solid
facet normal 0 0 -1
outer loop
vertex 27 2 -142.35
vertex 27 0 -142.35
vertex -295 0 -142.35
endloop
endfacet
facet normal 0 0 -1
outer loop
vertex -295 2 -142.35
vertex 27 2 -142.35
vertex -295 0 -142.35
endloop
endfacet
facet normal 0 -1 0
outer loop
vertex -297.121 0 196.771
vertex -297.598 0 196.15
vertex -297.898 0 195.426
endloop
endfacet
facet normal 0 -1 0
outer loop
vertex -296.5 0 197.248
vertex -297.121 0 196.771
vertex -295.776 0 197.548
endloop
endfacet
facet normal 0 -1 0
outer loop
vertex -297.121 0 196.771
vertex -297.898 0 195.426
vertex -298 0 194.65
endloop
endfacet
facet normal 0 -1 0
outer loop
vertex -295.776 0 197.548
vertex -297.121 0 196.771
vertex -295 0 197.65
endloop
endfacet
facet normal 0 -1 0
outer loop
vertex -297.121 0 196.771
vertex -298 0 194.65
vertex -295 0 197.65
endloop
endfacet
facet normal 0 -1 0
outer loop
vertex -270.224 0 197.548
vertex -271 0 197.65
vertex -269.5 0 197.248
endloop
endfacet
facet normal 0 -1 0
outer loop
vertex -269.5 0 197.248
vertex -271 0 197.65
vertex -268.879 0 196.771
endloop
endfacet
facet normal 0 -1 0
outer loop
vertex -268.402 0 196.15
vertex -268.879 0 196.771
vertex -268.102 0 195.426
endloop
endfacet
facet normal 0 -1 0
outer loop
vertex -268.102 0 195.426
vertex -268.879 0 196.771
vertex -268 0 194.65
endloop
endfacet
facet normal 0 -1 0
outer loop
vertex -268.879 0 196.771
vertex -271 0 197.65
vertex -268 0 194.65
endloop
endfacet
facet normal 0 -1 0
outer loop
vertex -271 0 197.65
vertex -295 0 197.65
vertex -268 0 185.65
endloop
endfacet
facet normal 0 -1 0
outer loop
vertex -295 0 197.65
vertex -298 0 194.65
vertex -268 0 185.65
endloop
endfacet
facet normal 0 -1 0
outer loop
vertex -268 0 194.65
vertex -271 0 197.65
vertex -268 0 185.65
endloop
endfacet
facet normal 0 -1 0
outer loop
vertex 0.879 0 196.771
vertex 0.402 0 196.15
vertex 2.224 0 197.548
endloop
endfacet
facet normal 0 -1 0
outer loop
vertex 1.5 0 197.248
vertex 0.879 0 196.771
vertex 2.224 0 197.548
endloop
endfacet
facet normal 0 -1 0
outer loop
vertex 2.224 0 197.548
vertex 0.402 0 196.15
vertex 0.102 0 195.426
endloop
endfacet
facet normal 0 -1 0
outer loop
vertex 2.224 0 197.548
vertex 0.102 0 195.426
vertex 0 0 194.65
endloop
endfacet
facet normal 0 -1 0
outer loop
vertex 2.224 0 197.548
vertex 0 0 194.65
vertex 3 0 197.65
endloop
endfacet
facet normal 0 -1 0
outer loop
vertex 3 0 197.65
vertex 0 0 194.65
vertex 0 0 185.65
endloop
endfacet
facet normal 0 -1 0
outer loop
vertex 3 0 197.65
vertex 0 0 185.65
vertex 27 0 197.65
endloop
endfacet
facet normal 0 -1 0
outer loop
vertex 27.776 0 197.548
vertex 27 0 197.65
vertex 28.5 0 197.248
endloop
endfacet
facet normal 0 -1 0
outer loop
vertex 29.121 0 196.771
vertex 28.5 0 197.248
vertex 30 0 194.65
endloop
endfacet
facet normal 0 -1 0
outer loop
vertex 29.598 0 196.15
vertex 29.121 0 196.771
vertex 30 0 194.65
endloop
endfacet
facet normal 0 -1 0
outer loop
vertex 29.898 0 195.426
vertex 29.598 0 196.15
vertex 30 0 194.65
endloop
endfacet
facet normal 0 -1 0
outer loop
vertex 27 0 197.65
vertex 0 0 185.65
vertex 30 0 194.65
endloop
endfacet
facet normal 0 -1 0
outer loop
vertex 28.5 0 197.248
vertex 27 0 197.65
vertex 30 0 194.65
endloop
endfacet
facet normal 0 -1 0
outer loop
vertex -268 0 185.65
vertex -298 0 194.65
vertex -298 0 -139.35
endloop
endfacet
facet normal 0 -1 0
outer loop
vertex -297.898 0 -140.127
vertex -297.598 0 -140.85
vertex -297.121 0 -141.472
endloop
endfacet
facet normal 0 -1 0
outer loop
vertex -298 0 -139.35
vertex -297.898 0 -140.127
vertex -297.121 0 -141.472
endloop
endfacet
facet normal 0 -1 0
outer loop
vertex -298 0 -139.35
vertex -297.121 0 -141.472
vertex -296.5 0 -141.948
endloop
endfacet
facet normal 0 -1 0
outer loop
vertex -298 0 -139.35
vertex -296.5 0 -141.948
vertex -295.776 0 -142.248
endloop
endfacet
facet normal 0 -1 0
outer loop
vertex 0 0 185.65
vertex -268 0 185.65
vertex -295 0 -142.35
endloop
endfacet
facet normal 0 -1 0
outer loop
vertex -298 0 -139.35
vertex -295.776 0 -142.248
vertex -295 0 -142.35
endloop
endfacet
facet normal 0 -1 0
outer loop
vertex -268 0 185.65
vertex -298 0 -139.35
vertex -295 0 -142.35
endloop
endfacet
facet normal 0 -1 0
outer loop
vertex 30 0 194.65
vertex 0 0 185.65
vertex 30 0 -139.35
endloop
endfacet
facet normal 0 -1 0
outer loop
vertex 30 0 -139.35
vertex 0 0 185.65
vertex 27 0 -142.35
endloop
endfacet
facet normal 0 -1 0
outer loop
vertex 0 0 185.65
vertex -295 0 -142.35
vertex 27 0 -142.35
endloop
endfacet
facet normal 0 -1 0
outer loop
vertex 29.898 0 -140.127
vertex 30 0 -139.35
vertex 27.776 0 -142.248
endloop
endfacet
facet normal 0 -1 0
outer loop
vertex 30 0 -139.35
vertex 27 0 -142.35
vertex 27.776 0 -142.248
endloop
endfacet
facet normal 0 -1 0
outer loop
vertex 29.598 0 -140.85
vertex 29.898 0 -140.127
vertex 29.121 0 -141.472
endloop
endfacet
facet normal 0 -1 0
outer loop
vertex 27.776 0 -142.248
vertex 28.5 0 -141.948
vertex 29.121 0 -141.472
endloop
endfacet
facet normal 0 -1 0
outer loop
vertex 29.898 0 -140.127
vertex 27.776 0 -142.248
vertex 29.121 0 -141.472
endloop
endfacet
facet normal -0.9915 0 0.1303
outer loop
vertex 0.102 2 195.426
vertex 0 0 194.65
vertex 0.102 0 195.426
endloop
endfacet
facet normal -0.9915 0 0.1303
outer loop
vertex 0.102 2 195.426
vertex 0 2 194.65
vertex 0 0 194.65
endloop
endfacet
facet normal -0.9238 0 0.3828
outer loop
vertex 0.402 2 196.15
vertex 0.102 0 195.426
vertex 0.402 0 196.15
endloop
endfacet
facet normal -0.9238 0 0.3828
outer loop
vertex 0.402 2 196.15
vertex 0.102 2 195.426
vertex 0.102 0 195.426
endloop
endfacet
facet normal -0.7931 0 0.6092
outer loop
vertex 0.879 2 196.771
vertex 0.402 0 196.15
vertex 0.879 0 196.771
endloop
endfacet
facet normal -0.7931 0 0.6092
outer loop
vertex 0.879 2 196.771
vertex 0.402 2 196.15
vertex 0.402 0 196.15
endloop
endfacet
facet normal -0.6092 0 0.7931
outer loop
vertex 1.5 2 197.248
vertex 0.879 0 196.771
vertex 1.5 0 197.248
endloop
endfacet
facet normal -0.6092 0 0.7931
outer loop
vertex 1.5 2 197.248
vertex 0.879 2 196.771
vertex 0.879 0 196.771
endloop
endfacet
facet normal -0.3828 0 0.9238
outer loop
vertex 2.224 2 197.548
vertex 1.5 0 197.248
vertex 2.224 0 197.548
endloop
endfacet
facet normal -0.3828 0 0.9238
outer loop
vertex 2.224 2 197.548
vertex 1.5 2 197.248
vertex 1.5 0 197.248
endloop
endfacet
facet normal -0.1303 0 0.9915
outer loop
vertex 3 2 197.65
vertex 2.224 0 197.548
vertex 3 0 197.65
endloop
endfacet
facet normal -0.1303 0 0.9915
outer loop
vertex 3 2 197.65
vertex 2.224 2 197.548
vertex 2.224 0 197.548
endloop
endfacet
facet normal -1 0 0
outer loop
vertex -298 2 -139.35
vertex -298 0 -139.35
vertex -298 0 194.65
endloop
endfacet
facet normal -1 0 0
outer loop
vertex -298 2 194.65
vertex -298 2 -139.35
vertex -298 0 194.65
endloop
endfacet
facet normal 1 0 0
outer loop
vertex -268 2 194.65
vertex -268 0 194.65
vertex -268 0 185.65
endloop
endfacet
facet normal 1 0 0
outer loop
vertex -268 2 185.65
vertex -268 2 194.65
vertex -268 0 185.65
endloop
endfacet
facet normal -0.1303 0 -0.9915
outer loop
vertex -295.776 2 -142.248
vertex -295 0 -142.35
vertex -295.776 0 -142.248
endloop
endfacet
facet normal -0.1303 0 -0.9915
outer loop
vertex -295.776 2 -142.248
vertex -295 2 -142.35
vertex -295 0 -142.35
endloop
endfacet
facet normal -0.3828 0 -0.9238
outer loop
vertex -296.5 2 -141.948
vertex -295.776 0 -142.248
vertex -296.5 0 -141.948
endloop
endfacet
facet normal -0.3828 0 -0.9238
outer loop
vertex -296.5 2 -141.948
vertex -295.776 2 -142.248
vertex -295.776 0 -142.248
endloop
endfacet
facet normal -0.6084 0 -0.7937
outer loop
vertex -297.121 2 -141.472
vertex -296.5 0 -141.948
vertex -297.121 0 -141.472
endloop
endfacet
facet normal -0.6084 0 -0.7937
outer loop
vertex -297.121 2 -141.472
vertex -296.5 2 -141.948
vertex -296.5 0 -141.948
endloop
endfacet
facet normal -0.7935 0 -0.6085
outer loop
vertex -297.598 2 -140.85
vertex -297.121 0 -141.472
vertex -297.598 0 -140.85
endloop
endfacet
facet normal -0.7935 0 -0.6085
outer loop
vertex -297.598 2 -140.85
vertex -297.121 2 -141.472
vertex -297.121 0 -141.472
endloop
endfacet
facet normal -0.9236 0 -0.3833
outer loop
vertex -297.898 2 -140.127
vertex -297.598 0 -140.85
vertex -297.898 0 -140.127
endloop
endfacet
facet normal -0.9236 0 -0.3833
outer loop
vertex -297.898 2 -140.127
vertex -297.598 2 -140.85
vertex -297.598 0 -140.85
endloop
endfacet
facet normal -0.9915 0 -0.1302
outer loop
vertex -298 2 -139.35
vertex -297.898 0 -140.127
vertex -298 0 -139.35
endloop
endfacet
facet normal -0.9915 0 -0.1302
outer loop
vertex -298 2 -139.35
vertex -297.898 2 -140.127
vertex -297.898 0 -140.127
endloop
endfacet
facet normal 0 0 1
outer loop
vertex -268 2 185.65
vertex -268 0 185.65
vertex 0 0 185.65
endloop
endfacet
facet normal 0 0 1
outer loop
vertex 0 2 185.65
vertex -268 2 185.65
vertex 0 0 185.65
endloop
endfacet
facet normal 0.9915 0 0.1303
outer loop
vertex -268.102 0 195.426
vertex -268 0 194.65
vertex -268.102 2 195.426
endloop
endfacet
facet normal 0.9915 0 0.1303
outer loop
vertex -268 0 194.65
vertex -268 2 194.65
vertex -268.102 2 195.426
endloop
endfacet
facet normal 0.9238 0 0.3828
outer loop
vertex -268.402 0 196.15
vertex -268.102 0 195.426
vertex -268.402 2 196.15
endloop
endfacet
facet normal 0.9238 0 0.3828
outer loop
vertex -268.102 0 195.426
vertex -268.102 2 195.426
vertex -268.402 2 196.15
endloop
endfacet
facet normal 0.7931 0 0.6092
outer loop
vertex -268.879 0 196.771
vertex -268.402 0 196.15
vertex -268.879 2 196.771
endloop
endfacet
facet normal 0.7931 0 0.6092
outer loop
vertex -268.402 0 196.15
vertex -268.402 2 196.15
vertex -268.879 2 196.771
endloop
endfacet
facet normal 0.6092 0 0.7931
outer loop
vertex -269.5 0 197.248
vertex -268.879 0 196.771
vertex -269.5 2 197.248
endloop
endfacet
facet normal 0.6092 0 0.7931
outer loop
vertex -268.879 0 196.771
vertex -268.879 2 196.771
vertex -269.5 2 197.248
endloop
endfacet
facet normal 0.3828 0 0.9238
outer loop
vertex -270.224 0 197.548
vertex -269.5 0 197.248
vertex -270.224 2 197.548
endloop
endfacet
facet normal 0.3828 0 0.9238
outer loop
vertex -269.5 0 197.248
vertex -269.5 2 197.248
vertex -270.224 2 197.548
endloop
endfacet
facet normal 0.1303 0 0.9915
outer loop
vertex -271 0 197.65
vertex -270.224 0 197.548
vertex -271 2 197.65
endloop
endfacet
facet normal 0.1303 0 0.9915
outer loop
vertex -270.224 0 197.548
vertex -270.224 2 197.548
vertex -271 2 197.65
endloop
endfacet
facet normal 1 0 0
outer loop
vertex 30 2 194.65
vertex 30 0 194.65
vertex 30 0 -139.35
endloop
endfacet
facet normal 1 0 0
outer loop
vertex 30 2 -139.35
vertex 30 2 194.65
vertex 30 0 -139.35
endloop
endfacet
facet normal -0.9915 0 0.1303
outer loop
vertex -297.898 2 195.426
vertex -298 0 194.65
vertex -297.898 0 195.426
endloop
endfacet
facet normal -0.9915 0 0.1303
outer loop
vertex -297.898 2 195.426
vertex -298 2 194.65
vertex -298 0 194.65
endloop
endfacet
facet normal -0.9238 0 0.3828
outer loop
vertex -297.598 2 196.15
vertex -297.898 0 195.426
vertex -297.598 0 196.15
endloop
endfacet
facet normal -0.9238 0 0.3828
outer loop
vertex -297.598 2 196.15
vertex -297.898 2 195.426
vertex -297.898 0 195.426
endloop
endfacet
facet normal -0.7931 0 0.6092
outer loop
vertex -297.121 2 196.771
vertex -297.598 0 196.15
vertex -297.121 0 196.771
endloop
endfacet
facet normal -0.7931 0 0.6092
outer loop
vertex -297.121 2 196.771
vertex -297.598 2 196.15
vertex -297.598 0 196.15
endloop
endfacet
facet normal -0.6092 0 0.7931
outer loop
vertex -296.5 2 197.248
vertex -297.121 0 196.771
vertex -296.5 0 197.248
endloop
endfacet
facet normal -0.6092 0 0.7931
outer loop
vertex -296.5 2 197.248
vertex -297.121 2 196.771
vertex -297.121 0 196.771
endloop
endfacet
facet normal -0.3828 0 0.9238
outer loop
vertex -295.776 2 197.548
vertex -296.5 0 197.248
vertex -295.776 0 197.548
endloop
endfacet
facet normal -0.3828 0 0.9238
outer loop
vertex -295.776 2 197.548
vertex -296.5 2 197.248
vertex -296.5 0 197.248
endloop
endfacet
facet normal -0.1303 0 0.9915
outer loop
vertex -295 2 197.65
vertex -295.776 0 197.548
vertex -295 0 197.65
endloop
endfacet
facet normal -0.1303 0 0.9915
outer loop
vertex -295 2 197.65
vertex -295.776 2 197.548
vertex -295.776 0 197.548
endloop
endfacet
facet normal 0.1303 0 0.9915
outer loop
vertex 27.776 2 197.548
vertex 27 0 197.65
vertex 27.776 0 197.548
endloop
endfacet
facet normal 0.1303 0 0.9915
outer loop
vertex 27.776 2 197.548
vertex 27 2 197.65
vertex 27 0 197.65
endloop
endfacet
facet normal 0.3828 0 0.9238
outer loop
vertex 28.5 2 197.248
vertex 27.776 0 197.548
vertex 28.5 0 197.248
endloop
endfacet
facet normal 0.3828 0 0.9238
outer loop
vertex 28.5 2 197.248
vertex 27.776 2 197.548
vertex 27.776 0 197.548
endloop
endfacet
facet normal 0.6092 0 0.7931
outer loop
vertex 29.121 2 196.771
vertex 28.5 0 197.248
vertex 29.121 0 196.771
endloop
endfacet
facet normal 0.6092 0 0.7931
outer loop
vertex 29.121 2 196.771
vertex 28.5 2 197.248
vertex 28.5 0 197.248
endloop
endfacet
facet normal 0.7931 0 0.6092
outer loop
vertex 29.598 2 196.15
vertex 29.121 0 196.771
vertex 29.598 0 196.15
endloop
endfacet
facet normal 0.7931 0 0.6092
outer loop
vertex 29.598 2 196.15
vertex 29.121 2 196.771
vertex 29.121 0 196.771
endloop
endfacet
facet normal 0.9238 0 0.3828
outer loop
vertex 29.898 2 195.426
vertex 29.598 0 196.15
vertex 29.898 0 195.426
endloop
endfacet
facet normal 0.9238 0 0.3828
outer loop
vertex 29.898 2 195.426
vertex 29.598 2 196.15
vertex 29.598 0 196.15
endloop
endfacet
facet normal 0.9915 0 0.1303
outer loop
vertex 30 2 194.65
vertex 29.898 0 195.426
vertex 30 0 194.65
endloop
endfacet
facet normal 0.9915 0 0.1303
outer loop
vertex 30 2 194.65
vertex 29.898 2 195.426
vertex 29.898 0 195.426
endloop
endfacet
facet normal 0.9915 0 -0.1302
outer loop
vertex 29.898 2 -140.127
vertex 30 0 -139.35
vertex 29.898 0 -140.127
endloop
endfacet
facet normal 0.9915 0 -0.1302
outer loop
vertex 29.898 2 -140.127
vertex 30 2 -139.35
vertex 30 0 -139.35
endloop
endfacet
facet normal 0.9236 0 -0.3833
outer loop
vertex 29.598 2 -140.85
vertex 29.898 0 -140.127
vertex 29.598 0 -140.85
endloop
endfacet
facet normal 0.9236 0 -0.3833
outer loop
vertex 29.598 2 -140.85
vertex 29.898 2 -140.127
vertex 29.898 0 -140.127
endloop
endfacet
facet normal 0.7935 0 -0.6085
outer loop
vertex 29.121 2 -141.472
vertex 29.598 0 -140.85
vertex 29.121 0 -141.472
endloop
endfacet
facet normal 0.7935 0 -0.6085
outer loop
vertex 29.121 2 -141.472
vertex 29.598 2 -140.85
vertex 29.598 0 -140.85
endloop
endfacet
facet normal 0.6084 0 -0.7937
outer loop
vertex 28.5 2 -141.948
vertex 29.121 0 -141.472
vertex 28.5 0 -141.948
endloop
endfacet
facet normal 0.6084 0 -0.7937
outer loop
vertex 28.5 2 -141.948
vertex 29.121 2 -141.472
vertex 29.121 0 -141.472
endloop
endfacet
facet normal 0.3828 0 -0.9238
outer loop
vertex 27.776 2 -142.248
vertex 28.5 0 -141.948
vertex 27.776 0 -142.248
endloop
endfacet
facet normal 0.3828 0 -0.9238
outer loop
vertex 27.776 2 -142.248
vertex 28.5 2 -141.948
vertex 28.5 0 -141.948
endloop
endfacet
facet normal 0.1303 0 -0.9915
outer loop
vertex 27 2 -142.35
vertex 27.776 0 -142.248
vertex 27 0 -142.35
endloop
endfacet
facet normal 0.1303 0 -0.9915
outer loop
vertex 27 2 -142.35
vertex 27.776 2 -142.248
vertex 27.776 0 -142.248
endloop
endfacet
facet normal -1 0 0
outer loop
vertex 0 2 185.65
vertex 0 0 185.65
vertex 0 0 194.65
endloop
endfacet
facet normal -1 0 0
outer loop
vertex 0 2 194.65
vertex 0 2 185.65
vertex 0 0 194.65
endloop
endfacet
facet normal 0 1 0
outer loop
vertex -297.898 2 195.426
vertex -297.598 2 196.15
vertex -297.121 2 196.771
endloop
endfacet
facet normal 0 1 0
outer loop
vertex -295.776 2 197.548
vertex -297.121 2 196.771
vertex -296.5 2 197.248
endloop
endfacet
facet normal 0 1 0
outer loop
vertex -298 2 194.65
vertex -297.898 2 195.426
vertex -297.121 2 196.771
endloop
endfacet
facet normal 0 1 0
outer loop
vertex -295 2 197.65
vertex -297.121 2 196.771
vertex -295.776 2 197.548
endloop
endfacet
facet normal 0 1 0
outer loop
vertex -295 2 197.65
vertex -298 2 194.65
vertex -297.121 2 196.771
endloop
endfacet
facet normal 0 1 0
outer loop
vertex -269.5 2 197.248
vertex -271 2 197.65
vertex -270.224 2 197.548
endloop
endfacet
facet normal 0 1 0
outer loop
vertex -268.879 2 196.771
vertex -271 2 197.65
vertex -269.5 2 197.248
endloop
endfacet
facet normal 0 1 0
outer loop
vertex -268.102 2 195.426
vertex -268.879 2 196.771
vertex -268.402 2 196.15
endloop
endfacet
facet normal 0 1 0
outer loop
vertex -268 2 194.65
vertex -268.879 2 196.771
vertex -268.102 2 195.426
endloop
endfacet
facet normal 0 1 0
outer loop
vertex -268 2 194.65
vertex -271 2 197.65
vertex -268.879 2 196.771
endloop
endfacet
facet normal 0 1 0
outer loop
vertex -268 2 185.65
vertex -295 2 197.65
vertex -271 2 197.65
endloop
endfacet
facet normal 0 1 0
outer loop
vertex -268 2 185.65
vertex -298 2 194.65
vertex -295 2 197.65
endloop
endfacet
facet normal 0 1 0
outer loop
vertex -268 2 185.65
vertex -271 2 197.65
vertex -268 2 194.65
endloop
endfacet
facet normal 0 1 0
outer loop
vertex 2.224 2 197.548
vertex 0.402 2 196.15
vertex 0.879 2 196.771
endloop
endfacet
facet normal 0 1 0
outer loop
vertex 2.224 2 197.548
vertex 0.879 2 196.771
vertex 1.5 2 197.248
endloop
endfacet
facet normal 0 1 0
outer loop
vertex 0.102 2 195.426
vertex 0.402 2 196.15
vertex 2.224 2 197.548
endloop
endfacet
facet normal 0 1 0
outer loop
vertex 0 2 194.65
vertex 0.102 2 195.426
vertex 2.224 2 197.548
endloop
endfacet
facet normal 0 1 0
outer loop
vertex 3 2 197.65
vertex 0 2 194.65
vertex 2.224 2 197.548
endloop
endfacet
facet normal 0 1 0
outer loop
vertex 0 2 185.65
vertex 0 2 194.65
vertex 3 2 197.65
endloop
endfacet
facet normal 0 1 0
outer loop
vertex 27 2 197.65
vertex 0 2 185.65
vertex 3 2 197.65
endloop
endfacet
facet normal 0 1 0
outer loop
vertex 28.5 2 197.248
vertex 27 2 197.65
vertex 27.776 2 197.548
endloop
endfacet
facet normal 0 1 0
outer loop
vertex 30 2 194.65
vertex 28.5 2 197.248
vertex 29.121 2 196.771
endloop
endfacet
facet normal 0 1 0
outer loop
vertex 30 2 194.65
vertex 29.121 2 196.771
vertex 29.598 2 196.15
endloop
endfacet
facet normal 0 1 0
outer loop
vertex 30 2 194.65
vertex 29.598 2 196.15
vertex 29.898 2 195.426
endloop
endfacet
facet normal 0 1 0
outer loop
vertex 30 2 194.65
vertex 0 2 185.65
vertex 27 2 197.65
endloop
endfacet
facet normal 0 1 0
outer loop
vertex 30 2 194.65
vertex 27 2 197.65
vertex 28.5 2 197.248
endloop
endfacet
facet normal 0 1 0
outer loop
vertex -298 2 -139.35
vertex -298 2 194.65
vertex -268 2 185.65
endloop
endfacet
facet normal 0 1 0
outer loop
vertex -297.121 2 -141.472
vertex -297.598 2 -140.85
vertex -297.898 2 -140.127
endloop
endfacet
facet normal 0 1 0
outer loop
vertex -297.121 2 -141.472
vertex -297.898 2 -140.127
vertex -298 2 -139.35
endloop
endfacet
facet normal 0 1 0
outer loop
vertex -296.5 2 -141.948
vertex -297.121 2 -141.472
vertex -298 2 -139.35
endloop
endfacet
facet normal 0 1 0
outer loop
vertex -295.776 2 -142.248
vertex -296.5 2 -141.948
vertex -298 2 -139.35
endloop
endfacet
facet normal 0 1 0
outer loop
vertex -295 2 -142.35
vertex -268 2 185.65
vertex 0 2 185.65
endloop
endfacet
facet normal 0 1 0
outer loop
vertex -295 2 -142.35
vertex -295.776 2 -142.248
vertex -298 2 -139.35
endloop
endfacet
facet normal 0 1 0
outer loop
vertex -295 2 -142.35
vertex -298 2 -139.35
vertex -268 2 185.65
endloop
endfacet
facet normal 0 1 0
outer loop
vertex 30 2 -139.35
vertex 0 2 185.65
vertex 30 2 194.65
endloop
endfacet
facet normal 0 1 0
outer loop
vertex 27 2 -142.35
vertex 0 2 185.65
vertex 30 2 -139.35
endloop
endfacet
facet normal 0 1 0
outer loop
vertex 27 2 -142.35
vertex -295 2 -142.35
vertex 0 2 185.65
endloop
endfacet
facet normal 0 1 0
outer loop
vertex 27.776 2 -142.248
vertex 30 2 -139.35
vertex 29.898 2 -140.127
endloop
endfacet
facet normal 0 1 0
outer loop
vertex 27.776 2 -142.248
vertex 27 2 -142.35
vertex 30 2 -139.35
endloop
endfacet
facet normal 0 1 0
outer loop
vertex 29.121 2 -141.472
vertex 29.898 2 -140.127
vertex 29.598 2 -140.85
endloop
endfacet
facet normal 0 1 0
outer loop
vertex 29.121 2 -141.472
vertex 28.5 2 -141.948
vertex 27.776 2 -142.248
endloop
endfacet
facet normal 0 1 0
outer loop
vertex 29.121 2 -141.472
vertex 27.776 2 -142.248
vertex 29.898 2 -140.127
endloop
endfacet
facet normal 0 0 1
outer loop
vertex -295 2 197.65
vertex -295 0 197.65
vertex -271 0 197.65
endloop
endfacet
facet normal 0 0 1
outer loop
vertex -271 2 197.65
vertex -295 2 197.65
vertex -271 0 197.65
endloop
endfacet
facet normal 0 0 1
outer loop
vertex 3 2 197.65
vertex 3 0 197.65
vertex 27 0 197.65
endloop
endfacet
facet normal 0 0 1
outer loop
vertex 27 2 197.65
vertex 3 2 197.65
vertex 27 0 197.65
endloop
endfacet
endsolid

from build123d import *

# Parameters (mm, degrees)
BOSS_EXTRUDE1_DEPTH = 2
FILLET1_R           = 3


with BuildPart() as part:
    # Sketch1 → Boss-Extrude1 (new body)
    with BuildSketch(Plane(origin=(0, 0, 0), x_dir=(1, 0, 0), z_dir=(0, 1, 0))):
        Polygon((-268, -197.649746193), (-268, -185.649746193), (0, -185.649746193), (0, -197.649746193), (30, -197.649746193), (30, 142.350253807), (-298, 142.350253807), (-298, -197.649746193), align=None)
    extrude(amount=BOSS_EXTRUDE1_DEPTH)

    # Fillet1
    fillet1_edges = [part.edges().sort_by_distance(p)[0] for p in [
        (-298, 1, -142.350253807),
        (30, 1, -142.350253807),
        (30, 1, 197.649746193),
        (0, 1, 197.649746193),
        (-268, 1, 197.649746193),
        (-298, 1, 197.649746193),
    ]]
    fillet(fillet1_edges, radius=FILLET1_R)


solid = part.part
